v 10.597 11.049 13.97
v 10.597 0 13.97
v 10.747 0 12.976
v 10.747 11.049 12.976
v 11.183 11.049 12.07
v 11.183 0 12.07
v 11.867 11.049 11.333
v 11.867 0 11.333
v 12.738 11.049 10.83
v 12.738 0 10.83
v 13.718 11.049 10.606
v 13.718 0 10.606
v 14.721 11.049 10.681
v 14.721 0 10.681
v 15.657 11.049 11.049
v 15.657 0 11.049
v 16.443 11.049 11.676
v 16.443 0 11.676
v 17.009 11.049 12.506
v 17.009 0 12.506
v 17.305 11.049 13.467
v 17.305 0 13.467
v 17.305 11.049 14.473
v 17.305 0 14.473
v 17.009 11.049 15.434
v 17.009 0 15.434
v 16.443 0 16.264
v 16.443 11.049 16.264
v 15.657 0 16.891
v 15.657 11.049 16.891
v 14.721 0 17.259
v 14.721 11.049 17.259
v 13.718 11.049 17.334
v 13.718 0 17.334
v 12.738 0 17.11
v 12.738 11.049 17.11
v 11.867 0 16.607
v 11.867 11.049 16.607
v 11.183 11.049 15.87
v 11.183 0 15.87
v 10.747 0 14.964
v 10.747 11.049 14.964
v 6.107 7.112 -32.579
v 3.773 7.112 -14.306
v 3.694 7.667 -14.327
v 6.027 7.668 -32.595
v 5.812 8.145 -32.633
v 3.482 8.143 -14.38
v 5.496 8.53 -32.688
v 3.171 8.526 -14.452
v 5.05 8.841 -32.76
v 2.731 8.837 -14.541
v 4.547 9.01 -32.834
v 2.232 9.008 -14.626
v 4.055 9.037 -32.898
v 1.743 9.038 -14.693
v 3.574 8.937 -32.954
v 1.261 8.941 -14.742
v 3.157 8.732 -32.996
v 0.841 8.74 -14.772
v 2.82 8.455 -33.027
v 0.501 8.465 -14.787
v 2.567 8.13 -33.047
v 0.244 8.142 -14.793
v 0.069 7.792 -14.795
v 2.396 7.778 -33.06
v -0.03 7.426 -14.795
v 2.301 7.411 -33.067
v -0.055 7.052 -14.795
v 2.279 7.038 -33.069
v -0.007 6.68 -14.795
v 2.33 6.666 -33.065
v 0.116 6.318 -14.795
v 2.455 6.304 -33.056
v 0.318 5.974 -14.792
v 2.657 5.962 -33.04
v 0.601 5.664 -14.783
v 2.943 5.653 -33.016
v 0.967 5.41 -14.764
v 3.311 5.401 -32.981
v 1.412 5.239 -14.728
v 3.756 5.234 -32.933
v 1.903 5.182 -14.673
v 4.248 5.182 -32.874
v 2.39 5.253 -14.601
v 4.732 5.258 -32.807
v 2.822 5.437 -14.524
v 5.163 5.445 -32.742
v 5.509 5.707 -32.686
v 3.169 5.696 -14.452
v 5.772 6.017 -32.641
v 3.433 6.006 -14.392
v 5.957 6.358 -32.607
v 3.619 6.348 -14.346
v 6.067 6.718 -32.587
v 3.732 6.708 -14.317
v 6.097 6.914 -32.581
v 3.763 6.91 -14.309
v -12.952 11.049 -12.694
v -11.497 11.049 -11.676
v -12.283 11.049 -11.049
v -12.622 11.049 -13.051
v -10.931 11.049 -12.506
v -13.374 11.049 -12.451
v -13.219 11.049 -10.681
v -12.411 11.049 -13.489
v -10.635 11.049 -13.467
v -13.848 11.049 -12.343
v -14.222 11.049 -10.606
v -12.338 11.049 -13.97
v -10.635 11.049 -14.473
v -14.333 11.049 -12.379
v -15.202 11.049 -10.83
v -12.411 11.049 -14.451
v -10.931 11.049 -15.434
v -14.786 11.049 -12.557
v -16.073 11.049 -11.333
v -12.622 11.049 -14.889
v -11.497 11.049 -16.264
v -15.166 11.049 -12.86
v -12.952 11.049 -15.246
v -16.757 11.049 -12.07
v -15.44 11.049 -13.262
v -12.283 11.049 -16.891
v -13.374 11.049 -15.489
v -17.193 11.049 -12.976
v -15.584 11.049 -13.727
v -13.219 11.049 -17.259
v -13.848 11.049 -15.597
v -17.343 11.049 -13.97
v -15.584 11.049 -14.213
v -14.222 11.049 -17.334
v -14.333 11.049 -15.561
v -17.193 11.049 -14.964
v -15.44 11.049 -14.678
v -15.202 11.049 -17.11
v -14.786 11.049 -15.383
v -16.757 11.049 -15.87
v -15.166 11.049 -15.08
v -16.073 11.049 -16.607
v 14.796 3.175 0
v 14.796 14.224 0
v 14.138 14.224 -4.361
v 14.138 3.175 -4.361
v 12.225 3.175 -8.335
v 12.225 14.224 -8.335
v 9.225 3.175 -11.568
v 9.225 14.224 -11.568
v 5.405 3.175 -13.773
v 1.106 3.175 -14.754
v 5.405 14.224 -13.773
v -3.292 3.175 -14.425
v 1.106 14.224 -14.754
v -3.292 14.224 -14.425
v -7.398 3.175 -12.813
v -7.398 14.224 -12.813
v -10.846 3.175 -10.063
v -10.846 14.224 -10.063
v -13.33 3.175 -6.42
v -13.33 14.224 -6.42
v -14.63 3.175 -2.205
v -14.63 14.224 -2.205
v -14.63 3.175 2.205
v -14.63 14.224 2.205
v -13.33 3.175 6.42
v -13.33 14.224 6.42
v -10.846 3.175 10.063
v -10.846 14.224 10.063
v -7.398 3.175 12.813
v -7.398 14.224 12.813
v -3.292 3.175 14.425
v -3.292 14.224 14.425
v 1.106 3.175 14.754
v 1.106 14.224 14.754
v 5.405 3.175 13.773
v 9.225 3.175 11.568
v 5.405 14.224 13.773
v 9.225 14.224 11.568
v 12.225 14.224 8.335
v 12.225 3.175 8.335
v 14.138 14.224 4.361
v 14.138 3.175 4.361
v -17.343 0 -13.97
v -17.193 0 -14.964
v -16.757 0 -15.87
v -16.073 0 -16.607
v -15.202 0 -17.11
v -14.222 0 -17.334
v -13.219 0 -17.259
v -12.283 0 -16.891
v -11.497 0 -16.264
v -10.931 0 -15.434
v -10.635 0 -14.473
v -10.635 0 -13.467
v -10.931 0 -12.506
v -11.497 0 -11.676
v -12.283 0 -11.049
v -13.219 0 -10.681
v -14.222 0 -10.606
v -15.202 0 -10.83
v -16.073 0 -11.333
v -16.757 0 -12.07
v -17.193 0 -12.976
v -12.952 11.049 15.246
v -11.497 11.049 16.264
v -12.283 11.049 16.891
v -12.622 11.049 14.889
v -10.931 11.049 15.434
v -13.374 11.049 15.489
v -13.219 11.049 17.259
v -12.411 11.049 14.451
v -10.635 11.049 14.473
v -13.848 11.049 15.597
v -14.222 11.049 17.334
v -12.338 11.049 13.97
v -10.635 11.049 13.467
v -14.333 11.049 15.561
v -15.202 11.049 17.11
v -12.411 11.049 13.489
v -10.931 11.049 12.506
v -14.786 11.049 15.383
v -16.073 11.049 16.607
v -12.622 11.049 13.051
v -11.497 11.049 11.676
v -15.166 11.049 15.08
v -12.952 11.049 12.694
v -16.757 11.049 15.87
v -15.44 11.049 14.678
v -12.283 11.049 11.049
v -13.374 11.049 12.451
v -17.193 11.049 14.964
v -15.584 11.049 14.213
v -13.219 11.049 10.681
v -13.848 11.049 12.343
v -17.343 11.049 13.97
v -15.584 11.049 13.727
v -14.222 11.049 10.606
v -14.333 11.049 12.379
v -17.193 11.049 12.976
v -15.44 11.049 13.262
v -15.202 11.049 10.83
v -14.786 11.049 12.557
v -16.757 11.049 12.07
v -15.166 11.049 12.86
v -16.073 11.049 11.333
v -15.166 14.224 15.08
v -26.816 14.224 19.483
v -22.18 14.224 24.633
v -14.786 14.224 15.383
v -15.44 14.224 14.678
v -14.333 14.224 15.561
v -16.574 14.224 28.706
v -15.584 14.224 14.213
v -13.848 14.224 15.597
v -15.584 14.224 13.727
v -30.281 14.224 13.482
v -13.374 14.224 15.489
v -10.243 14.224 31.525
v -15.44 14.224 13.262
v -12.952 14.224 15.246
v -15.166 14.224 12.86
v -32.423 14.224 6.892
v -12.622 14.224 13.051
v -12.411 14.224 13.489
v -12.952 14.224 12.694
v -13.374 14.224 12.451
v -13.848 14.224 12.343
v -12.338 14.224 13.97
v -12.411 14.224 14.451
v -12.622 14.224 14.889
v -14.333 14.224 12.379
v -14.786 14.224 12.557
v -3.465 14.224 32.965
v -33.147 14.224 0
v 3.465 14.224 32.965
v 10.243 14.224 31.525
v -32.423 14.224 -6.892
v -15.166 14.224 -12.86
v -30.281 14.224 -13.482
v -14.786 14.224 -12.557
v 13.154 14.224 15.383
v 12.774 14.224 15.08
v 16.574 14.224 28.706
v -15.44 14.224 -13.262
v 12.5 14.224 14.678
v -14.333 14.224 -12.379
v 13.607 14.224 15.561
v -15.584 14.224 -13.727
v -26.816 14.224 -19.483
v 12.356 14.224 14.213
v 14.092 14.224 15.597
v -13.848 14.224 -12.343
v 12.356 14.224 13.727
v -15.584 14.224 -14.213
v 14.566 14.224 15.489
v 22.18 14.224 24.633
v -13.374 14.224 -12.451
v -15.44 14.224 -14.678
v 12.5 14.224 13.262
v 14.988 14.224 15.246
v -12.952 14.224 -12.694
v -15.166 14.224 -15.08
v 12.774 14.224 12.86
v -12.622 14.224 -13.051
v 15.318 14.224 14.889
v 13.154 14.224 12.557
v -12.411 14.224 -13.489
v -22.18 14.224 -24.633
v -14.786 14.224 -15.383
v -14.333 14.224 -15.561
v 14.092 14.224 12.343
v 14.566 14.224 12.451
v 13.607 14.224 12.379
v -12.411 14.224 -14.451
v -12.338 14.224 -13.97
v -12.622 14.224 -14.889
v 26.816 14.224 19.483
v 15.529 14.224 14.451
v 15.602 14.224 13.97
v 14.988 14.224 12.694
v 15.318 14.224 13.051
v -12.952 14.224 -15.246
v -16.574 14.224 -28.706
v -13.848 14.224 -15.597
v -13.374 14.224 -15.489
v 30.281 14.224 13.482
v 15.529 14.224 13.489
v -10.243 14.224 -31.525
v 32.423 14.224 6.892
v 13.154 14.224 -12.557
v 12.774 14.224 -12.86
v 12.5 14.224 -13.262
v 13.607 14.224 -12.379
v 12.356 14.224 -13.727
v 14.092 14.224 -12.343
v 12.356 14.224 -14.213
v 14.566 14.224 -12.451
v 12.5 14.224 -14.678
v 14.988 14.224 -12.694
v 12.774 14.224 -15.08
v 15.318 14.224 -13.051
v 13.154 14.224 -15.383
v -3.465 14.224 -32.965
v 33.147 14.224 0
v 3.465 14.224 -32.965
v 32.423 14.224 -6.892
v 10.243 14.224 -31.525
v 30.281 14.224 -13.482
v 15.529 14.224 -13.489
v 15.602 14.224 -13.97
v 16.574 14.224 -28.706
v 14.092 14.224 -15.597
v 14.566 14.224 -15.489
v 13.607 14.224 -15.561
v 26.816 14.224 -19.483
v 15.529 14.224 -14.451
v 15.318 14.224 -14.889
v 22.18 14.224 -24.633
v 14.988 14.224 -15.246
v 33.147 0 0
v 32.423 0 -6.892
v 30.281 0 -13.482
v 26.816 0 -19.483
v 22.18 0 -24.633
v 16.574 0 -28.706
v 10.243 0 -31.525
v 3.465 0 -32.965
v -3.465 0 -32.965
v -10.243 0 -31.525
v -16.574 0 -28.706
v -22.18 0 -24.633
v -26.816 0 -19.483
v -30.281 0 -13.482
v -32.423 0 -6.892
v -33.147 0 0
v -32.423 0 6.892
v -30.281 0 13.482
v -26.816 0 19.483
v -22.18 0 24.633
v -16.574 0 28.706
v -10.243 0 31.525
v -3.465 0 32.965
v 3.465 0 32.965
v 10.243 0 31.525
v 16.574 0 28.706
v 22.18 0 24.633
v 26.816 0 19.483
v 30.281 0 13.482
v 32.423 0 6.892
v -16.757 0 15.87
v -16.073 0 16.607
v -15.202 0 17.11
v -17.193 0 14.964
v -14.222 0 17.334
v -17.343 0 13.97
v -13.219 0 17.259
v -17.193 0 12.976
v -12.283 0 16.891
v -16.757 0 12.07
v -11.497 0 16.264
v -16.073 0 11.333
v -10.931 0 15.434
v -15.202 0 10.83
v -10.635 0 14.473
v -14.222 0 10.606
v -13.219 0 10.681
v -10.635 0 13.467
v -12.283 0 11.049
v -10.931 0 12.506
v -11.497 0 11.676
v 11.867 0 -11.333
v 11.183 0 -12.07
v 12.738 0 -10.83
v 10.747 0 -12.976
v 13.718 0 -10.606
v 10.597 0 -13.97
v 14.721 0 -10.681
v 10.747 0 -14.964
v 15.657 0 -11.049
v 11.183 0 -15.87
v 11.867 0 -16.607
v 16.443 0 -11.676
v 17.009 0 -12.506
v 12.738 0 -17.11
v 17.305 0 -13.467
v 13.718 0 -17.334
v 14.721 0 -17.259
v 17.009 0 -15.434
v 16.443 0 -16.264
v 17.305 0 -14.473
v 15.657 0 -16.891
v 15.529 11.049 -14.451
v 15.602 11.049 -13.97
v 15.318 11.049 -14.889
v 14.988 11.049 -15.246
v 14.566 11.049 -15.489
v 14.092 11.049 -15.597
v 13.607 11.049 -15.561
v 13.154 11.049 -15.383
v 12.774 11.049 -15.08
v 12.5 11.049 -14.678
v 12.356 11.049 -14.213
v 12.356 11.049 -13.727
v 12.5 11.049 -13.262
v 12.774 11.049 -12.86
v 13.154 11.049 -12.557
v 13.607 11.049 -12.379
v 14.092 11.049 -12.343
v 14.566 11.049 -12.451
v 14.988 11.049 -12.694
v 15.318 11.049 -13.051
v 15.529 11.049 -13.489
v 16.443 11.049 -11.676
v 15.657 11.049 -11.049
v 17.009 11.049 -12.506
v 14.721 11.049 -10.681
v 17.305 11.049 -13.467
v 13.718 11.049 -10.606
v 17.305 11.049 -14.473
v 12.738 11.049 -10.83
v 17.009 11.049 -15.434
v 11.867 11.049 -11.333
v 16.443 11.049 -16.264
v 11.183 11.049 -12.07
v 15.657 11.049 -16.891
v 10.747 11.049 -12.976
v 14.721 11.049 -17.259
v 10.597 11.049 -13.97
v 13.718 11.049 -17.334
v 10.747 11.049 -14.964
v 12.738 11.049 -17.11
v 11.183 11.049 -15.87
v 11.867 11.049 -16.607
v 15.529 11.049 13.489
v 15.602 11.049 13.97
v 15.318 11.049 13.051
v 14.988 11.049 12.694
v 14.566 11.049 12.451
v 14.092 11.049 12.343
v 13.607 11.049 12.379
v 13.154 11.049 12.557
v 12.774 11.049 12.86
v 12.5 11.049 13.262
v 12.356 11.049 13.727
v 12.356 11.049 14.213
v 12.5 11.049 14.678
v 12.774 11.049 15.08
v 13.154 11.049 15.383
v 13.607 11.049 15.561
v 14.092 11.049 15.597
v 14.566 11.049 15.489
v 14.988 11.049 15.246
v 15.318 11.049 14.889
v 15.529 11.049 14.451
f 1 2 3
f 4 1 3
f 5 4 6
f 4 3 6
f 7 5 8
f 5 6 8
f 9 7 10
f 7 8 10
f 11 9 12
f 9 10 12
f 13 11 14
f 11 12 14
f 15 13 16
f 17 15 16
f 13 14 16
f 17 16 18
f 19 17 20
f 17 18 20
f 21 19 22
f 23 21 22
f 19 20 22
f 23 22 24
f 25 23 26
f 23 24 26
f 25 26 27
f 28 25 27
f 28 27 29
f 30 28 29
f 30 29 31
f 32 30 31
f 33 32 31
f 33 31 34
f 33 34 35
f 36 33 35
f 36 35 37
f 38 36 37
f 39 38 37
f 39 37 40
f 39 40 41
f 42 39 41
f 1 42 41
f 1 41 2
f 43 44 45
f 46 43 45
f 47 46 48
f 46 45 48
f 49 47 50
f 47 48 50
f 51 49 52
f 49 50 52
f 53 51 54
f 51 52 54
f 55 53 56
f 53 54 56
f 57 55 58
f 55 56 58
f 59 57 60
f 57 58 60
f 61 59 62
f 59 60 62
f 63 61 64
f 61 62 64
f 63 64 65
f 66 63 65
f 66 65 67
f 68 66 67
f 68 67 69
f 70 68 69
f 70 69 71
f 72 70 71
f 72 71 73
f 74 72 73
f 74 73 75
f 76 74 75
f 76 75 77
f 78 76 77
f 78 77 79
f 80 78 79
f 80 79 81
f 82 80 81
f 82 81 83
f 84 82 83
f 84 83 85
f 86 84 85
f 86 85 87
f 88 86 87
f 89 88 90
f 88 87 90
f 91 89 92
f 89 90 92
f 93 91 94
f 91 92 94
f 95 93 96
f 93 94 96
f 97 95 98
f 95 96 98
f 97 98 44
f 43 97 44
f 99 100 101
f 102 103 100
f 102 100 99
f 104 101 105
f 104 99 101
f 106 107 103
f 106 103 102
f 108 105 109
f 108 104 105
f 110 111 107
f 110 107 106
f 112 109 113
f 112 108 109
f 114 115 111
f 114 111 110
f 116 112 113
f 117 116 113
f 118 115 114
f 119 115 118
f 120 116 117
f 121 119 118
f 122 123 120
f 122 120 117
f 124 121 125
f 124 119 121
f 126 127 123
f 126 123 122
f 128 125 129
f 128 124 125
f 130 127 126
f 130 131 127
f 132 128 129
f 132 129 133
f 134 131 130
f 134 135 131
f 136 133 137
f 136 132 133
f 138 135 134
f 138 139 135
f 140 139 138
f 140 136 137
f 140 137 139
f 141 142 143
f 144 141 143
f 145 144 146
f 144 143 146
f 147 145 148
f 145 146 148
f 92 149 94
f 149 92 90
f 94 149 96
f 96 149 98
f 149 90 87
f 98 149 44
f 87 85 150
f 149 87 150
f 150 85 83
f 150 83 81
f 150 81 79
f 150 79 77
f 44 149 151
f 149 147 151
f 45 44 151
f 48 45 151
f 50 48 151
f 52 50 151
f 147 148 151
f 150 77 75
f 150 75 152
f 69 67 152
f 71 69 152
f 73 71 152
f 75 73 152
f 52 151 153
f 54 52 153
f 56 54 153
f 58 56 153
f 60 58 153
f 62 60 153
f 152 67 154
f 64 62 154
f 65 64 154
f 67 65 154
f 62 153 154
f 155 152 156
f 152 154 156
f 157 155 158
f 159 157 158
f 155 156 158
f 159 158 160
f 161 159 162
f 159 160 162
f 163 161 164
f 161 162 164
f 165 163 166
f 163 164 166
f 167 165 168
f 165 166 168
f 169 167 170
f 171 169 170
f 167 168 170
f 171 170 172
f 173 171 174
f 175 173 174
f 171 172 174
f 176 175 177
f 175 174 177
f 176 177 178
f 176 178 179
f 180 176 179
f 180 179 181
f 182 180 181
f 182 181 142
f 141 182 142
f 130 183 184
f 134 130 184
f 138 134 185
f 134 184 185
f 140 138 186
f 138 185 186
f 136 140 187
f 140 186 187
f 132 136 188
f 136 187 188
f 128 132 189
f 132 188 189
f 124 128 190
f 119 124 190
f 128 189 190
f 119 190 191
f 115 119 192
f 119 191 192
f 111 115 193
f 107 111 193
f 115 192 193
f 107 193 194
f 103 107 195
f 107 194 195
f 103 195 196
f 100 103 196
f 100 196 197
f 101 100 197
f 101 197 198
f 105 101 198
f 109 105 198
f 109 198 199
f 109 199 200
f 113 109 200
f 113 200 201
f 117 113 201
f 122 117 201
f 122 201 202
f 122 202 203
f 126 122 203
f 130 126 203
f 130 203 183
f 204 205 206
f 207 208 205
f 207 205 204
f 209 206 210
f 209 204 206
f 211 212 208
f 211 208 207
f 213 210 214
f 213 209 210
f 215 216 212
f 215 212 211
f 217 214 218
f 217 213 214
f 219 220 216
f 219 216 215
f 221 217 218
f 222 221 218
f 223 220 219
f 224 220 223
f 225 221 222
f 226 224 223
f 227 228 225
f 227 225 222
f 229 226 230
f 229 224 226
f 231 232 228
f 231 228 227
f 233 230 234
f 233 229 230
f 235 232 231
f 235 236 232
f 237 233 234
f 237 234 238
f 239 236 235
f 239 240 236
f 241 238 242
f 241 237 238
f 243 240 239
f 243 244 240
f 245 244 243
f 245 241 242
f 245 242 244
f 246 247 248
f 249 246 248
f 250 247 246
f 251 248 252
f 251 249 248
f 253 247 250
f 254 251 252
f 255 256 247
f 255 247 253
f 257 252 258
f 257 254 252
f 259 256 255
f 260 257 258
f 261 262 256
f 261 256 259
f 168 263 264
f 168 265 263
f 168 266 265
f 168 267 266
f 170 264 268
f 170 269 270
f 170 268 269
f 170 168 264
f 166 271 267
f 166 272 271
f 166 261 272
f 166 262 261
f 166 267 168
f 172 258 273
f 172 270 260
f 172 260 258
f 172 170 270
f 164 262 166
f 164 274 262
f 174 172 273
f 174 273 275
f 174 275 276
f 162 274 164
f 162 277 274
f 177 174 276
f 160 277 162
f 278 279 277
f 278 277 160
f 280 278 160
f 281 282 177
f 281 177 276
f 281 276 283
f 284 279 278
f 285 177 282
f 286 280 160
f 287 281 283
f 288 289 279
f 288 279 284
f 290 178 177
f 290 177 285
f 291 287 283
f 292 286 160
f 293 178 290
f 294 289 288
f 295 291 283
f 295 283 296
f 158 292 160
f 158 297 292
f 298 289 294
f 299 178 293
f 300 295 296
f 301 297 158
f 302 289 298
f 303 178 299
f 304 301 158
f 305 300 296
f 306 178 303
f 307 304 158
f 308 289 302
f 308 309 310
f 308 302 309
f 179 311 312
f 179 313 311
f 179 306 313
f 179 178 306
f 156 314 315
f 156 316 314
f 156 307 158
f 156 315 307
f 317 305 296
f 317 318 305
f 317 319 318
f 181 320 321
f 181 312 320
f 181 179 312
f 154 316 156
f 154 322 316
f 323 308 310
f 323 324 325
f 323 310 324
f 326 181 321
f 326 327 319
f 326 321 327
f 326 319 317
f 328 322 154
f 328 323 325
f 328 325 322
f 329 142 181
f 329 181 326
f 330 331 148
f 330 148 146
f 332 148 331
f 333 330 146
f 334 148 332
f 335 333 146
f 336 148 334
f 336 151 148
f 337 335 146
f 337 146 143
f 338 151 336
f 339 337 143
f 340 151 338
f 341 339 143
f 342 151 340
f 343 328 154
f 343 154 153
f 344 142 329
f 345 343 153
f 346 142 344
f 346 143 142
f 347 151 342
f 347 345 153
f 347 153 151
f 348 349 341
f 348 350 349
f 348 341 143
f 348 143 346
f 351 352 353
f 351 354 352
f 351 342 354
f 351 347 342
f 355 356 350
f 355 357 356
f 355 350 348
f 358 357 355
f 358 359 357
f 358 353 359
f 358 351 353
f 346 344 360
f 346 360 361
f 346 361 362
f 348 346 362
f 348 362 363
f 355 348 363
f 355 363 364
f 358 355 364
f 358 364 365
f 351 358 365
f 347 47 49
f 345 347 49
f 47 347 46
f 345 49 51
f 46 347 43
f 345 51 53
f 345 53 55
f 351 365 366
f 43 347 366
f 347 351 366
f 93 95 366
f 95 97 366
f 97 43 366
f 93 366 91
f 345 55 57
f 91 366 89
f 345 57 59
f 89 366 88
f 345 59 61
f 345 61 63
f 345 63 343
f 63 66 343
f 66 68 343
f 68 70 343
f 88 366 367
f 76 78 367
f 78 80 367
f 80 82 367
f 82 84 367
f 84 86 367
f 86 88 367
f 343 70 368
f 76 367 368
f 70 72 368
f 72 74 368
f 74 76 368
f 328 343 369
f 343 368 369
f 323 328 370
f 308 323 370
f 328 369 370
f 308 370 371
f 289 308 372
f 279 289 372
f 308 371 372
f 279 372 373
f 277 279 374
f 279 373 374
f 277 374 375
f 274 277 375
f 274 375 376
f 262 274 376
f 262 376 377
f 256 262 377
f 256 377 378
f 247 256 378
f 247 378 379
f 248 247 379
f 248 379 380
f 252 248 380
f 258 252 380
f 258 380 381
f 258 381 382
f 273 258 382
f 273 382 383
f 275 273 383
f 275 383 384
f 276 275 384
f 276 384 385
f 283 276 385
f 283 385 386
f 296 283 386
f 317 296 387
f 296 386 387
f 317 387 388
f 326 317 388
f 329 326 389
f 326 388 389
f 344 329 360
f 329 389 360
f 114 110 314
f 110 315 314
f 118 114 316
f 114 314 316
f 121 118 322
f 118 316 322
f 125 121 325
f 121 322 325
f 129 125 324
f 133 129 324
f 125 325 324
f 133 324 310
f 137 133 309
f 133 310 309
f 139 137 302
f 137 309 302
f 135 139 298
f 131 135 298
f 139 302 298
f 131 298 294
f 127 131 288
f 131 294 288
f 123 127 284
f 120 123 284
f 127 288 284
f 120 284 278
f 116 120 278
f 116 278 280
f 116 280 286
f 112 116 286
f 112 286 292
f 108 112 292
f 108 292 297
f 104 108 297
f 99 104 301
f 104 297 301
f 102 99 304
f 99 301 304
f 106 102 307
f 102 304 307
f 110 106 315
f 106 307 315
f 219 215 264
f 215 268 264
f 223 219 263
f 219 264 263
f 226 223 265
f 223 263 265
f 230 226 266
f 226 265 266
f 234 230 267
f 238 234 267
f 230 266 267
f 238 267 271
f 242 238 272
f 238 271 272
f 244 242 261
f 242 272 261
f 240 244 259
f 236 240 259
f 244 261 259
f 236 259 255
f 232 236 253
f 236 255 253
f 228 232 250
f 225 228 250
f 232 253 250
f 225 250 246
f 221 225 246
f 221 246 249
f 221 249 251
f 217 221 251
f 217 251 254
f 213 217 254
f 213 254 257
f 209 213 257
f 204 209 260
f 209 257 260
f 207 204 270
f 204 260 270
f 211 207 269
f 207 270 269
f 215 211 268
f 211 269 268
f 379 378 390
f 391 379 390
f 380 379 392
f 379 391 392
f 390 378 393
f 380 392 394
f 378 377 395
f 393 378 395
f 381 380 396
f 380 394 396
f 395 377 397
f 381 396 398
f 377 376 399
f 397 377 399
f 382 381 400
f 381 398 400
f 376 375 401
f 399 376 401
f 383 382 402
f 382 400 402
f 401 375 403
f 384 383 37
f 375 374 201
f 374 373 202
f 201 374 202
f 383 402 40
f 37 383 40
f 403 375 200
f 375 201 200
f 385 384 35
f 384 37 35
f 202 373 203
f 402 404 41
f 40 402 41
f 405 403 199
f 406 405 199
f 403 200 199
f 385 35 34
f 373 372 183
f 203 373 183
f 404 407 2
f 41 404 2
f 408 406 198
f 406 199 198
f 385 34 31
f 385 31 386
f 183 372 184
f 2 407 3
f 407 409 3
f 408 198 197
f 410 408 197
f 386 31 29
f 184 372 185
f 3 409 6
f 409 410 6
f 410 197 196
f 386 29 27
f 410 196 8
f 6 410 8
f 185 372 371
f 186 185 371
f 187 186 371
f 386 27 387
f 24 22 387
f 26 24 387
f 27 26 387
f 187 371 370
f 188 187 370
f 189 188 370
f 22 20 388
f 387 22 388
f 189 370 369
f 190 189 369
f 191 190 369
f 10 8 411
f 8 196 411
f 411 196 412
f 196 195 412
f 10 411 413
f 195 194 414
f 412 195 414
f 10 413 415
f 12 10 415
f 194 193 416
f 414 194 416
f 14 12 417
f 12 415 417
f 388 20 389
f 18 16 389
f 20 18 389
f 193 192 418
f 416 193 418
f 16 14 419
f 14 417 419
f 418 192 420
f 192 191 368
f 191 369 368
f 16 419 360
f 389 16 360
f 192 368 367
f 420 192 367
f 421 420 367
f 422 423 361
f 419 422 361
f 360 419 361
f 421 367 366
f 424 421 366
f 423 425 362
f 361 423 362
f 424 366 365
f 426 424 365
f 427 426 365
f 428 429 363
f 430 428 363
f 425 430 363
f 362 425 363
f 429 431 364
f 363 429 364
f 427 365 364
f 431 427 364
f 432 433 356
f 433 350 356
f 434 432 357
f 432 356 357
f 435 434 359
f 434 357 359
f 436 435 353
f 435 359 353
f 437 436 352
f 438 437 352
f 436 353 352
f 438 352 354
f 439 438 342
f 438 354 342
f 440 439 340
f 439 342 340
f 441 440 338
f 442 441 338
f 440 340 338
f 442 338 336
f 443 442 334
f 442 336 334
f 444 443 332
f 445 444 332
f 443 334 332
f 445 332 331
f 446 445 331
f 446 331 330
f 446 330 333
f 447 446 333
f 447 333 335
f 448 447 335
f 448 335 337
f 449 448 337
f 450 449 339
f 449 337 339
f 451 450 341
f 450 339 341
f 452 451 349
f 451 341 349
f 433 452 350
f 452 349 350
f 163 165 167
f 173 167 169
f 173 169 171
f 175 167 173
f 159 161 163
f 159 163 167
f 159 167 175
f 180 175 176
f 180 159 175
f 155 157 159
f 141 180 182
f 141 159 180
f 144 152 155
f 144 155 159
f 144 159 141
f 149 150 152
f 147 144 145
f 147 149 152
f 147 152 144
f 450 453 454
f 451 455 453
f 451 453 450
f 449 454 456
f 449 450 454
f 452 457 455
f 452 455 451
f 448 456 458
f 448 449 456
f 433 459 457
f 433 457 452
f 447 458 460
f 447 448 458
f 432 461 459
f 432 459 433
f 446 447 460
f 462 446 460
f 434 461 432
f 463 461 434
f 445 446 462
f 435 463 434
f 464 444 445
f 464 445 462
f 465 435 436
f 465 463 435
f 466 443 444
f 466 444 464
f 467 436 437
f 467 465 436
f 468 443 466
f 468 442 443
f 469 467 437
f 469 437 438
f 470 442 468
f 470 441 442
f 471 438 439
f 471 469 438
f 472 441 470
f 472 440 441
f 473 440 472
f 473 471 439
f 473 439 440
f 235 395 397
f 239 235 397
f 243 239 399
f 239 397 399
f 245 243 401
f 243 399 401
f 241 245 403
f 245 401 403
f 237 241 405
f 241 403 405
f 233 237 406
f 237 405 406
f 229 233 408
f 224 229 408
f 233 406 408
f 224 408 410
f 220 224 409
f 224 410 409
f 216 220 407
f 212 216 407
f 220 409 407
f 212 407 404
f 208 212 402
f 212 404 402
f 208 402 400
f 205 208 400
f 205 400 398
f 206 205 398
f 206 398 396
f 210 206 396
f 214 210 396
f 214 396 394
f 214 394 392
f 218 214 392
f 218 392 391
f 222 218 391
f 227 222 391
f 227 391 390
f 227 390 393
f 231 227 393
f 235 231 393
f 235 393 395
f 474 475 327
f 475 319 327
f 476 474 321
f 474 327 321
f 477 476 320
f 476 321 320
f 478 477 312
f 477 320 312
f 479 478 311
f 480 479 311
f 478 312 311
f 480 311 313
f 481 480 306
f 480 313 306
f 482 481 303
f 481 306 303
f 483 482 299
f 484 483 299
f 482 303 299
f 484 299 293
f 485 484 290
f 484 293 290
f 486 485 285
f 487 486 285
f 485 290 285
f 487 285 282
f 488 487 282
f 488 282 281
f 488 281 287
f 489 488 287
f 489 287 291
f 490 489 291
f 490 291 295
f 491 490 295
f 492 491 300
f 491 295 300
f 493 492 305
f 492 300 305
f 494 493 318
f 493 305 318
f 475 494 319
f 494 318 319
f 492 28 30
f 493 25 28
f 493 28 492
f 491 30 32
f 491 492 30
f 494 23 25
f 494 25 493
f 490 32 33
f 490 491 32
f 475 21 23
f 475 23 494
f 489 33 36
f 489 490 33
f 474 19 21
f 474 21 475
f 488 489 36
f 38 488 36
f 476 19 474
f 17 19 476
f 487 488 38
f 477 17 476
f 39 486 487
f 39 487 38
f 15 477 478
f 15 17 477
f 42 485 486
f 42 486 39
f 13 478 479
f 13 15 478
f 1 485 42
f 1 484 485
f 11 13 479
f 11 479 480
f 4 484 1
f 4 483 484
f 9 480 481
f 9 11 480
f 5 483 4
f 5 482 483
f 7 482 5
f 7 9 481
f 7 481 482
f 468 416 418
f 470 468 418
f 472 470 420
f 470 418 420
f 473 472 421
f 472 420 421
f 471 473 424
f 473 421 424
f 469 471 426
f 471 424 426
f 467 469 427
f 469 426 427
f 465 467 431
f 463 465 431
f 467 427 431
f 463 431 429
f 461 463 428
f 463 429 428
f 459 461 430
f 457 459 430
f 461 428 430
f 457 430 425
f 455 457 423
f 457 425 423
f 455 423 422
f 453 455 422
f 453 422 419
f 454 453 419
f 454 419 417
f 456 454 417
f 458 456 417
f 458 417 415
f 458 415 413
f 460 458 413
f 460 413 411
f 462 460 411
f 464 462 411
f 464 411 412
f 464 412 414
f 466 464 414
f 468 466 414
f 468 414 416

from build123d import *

# Parameters (mm, degrees)
SKETCH2_R                                           = 33.147
BOSS_EXTRUDE1_DEPTH                                 = 14.224
SKETCH4_R                                           = 14.7955
CUT_EXTRUDE1_DEPTH                                  = 11.049
F_24_0_152_DIAMETER_HOLE1_D                         = 3.8608
F_24_0_152_DIAMETER_HOLE1_DEPTH                     = 25.4
F_24_0_152_DIAMETER_HOLE1_TIP                       = 1.159901339
F_24_0_152_DIAMETER_HOLE1_ON_FACE_2_D               = 3.8608
F_24_0_152_DIAMETER_HOLE1_ON_FACE_2_DEPTH           = 25.4
F_24_0_152_DIAMETER_HOLE1_ON_FACE_2_TIP             = 1.159901339
CBORE_FOR_4_BINDING_HEAD_MACHINE_SCREW1_D           = 3.2639
CBORE_FOR_4_BINDING_HEAD_MACHINE_SCREW1_CBORE_D     = 6.74624
CBORE_FOR_4_BINDING_HEAD_MACHINE_SCREW1_CBORE_DEPTH = 11.049


with BuildPart() as part:
    # Sketch2 → Boss-Extrude1 (new body)
    with BuildSketch(Plane(origin=(0, 0, 0), x_dir=(1, 0, 0), z_dir=(0, 1, 0))):
        Circle(SKETCH2_R)
    extrude(amount=BOSS_EXTRUDE1_DEPTH)

    # Sketch4 → Cut-Extrude1 (cut)
    with BuildSketch(Plane(origin=(0, 14.224, 0), x_dir=(1, 0, 0), z_dir=(0, 1, 0))):
        Circle(SKETCH4_R)
    extrude(amount=-CUT_EXTRUDE1_DEPTH, mode=Mode.SUBTRACT)

    # #24 (0.152) Diameter Hole1
    with Locations(Plane(origin=(4.199730969, 7.112, -32.879870267), x_dir=(-0.991941059, 0, -0.126700183), z_dir=(0.126700183, 0, -0.991941059))):
        with Locations((0, 0)):
            Hole(F_24_0_152_DIAMETER_HOLE1_D / 2, depth=F_24_0_152_DIAMETER_HOLE1_DEPTH)
            with Locations((0, 0, -(F_24_0_152_DIAMETER_HOLE1_DEPTH + F_24_0_152_DIAMETER_HOLE1_TIP / 2))):  # 118° drill point
                Cone(0, F_24_0_152_DIAMETER_HOLE1_D / 2, F_24_0_152_DIAMETER_HOLE1_TIP, mode=Mode.SUBTRACT)

    # #24 (0.152) Diameter Hole1 on face 2
    with Locations(Plane(origin=(55.026579736, -11.282884423, 0), x_dir=(-0.991941059, 0, -0.126700183), z_dir=(0.126700183, 0, -0.991941059))):
        with Locations((0, 0)):
            Hole(F_24_0_152_DIAMETER_HOLE1_ON_FACE_2_D / 2, depth=F_24_0_152_DIAMETER_HOLE1_ON_FACE_2_DEPTH)
            with Locations((0, 0, -(F_24_0_152_DIAMETER_HOLE1_ON_FACE_2_DEPTH + F_24_0_152_DIAMETER_HOLE1_ON_FACE_2_TIP / 2))):  # 118° drill point
                Cone(0, F_24_0_152_DIAMETER_HOLE1_ON_FACE_2_D / 2, F_24_0_152_DIAMETER_HOLE1_ON_FACE_2_TIP, mode=Mode.SUBTRACT)

    # CBORE for #4 Binding Head Machine Screw1 (through all)
    with Locations(Plane(origin=(0, 0, 0), x_dir=(-1, 0, 0), z_dir=(0, -1, 0))):
        with Locations((13.97, -13.97), (-13.97, -13.97), (-13.97, 13.97), (13.97, 13.97)):
            CounterBoreHole(CBORE_FOR_4_BINDING_HEAD_MACHINE_SCREW1_D / 2, CBORE_FOR_4_BINDING_HEAD_MACHINE_SCREW1_CBORE_D / 2, CBORE_FOR_4_BINDING_HEAD_MACHINE_SCREW1_CBORE_DEPTH)


solid = part.part
